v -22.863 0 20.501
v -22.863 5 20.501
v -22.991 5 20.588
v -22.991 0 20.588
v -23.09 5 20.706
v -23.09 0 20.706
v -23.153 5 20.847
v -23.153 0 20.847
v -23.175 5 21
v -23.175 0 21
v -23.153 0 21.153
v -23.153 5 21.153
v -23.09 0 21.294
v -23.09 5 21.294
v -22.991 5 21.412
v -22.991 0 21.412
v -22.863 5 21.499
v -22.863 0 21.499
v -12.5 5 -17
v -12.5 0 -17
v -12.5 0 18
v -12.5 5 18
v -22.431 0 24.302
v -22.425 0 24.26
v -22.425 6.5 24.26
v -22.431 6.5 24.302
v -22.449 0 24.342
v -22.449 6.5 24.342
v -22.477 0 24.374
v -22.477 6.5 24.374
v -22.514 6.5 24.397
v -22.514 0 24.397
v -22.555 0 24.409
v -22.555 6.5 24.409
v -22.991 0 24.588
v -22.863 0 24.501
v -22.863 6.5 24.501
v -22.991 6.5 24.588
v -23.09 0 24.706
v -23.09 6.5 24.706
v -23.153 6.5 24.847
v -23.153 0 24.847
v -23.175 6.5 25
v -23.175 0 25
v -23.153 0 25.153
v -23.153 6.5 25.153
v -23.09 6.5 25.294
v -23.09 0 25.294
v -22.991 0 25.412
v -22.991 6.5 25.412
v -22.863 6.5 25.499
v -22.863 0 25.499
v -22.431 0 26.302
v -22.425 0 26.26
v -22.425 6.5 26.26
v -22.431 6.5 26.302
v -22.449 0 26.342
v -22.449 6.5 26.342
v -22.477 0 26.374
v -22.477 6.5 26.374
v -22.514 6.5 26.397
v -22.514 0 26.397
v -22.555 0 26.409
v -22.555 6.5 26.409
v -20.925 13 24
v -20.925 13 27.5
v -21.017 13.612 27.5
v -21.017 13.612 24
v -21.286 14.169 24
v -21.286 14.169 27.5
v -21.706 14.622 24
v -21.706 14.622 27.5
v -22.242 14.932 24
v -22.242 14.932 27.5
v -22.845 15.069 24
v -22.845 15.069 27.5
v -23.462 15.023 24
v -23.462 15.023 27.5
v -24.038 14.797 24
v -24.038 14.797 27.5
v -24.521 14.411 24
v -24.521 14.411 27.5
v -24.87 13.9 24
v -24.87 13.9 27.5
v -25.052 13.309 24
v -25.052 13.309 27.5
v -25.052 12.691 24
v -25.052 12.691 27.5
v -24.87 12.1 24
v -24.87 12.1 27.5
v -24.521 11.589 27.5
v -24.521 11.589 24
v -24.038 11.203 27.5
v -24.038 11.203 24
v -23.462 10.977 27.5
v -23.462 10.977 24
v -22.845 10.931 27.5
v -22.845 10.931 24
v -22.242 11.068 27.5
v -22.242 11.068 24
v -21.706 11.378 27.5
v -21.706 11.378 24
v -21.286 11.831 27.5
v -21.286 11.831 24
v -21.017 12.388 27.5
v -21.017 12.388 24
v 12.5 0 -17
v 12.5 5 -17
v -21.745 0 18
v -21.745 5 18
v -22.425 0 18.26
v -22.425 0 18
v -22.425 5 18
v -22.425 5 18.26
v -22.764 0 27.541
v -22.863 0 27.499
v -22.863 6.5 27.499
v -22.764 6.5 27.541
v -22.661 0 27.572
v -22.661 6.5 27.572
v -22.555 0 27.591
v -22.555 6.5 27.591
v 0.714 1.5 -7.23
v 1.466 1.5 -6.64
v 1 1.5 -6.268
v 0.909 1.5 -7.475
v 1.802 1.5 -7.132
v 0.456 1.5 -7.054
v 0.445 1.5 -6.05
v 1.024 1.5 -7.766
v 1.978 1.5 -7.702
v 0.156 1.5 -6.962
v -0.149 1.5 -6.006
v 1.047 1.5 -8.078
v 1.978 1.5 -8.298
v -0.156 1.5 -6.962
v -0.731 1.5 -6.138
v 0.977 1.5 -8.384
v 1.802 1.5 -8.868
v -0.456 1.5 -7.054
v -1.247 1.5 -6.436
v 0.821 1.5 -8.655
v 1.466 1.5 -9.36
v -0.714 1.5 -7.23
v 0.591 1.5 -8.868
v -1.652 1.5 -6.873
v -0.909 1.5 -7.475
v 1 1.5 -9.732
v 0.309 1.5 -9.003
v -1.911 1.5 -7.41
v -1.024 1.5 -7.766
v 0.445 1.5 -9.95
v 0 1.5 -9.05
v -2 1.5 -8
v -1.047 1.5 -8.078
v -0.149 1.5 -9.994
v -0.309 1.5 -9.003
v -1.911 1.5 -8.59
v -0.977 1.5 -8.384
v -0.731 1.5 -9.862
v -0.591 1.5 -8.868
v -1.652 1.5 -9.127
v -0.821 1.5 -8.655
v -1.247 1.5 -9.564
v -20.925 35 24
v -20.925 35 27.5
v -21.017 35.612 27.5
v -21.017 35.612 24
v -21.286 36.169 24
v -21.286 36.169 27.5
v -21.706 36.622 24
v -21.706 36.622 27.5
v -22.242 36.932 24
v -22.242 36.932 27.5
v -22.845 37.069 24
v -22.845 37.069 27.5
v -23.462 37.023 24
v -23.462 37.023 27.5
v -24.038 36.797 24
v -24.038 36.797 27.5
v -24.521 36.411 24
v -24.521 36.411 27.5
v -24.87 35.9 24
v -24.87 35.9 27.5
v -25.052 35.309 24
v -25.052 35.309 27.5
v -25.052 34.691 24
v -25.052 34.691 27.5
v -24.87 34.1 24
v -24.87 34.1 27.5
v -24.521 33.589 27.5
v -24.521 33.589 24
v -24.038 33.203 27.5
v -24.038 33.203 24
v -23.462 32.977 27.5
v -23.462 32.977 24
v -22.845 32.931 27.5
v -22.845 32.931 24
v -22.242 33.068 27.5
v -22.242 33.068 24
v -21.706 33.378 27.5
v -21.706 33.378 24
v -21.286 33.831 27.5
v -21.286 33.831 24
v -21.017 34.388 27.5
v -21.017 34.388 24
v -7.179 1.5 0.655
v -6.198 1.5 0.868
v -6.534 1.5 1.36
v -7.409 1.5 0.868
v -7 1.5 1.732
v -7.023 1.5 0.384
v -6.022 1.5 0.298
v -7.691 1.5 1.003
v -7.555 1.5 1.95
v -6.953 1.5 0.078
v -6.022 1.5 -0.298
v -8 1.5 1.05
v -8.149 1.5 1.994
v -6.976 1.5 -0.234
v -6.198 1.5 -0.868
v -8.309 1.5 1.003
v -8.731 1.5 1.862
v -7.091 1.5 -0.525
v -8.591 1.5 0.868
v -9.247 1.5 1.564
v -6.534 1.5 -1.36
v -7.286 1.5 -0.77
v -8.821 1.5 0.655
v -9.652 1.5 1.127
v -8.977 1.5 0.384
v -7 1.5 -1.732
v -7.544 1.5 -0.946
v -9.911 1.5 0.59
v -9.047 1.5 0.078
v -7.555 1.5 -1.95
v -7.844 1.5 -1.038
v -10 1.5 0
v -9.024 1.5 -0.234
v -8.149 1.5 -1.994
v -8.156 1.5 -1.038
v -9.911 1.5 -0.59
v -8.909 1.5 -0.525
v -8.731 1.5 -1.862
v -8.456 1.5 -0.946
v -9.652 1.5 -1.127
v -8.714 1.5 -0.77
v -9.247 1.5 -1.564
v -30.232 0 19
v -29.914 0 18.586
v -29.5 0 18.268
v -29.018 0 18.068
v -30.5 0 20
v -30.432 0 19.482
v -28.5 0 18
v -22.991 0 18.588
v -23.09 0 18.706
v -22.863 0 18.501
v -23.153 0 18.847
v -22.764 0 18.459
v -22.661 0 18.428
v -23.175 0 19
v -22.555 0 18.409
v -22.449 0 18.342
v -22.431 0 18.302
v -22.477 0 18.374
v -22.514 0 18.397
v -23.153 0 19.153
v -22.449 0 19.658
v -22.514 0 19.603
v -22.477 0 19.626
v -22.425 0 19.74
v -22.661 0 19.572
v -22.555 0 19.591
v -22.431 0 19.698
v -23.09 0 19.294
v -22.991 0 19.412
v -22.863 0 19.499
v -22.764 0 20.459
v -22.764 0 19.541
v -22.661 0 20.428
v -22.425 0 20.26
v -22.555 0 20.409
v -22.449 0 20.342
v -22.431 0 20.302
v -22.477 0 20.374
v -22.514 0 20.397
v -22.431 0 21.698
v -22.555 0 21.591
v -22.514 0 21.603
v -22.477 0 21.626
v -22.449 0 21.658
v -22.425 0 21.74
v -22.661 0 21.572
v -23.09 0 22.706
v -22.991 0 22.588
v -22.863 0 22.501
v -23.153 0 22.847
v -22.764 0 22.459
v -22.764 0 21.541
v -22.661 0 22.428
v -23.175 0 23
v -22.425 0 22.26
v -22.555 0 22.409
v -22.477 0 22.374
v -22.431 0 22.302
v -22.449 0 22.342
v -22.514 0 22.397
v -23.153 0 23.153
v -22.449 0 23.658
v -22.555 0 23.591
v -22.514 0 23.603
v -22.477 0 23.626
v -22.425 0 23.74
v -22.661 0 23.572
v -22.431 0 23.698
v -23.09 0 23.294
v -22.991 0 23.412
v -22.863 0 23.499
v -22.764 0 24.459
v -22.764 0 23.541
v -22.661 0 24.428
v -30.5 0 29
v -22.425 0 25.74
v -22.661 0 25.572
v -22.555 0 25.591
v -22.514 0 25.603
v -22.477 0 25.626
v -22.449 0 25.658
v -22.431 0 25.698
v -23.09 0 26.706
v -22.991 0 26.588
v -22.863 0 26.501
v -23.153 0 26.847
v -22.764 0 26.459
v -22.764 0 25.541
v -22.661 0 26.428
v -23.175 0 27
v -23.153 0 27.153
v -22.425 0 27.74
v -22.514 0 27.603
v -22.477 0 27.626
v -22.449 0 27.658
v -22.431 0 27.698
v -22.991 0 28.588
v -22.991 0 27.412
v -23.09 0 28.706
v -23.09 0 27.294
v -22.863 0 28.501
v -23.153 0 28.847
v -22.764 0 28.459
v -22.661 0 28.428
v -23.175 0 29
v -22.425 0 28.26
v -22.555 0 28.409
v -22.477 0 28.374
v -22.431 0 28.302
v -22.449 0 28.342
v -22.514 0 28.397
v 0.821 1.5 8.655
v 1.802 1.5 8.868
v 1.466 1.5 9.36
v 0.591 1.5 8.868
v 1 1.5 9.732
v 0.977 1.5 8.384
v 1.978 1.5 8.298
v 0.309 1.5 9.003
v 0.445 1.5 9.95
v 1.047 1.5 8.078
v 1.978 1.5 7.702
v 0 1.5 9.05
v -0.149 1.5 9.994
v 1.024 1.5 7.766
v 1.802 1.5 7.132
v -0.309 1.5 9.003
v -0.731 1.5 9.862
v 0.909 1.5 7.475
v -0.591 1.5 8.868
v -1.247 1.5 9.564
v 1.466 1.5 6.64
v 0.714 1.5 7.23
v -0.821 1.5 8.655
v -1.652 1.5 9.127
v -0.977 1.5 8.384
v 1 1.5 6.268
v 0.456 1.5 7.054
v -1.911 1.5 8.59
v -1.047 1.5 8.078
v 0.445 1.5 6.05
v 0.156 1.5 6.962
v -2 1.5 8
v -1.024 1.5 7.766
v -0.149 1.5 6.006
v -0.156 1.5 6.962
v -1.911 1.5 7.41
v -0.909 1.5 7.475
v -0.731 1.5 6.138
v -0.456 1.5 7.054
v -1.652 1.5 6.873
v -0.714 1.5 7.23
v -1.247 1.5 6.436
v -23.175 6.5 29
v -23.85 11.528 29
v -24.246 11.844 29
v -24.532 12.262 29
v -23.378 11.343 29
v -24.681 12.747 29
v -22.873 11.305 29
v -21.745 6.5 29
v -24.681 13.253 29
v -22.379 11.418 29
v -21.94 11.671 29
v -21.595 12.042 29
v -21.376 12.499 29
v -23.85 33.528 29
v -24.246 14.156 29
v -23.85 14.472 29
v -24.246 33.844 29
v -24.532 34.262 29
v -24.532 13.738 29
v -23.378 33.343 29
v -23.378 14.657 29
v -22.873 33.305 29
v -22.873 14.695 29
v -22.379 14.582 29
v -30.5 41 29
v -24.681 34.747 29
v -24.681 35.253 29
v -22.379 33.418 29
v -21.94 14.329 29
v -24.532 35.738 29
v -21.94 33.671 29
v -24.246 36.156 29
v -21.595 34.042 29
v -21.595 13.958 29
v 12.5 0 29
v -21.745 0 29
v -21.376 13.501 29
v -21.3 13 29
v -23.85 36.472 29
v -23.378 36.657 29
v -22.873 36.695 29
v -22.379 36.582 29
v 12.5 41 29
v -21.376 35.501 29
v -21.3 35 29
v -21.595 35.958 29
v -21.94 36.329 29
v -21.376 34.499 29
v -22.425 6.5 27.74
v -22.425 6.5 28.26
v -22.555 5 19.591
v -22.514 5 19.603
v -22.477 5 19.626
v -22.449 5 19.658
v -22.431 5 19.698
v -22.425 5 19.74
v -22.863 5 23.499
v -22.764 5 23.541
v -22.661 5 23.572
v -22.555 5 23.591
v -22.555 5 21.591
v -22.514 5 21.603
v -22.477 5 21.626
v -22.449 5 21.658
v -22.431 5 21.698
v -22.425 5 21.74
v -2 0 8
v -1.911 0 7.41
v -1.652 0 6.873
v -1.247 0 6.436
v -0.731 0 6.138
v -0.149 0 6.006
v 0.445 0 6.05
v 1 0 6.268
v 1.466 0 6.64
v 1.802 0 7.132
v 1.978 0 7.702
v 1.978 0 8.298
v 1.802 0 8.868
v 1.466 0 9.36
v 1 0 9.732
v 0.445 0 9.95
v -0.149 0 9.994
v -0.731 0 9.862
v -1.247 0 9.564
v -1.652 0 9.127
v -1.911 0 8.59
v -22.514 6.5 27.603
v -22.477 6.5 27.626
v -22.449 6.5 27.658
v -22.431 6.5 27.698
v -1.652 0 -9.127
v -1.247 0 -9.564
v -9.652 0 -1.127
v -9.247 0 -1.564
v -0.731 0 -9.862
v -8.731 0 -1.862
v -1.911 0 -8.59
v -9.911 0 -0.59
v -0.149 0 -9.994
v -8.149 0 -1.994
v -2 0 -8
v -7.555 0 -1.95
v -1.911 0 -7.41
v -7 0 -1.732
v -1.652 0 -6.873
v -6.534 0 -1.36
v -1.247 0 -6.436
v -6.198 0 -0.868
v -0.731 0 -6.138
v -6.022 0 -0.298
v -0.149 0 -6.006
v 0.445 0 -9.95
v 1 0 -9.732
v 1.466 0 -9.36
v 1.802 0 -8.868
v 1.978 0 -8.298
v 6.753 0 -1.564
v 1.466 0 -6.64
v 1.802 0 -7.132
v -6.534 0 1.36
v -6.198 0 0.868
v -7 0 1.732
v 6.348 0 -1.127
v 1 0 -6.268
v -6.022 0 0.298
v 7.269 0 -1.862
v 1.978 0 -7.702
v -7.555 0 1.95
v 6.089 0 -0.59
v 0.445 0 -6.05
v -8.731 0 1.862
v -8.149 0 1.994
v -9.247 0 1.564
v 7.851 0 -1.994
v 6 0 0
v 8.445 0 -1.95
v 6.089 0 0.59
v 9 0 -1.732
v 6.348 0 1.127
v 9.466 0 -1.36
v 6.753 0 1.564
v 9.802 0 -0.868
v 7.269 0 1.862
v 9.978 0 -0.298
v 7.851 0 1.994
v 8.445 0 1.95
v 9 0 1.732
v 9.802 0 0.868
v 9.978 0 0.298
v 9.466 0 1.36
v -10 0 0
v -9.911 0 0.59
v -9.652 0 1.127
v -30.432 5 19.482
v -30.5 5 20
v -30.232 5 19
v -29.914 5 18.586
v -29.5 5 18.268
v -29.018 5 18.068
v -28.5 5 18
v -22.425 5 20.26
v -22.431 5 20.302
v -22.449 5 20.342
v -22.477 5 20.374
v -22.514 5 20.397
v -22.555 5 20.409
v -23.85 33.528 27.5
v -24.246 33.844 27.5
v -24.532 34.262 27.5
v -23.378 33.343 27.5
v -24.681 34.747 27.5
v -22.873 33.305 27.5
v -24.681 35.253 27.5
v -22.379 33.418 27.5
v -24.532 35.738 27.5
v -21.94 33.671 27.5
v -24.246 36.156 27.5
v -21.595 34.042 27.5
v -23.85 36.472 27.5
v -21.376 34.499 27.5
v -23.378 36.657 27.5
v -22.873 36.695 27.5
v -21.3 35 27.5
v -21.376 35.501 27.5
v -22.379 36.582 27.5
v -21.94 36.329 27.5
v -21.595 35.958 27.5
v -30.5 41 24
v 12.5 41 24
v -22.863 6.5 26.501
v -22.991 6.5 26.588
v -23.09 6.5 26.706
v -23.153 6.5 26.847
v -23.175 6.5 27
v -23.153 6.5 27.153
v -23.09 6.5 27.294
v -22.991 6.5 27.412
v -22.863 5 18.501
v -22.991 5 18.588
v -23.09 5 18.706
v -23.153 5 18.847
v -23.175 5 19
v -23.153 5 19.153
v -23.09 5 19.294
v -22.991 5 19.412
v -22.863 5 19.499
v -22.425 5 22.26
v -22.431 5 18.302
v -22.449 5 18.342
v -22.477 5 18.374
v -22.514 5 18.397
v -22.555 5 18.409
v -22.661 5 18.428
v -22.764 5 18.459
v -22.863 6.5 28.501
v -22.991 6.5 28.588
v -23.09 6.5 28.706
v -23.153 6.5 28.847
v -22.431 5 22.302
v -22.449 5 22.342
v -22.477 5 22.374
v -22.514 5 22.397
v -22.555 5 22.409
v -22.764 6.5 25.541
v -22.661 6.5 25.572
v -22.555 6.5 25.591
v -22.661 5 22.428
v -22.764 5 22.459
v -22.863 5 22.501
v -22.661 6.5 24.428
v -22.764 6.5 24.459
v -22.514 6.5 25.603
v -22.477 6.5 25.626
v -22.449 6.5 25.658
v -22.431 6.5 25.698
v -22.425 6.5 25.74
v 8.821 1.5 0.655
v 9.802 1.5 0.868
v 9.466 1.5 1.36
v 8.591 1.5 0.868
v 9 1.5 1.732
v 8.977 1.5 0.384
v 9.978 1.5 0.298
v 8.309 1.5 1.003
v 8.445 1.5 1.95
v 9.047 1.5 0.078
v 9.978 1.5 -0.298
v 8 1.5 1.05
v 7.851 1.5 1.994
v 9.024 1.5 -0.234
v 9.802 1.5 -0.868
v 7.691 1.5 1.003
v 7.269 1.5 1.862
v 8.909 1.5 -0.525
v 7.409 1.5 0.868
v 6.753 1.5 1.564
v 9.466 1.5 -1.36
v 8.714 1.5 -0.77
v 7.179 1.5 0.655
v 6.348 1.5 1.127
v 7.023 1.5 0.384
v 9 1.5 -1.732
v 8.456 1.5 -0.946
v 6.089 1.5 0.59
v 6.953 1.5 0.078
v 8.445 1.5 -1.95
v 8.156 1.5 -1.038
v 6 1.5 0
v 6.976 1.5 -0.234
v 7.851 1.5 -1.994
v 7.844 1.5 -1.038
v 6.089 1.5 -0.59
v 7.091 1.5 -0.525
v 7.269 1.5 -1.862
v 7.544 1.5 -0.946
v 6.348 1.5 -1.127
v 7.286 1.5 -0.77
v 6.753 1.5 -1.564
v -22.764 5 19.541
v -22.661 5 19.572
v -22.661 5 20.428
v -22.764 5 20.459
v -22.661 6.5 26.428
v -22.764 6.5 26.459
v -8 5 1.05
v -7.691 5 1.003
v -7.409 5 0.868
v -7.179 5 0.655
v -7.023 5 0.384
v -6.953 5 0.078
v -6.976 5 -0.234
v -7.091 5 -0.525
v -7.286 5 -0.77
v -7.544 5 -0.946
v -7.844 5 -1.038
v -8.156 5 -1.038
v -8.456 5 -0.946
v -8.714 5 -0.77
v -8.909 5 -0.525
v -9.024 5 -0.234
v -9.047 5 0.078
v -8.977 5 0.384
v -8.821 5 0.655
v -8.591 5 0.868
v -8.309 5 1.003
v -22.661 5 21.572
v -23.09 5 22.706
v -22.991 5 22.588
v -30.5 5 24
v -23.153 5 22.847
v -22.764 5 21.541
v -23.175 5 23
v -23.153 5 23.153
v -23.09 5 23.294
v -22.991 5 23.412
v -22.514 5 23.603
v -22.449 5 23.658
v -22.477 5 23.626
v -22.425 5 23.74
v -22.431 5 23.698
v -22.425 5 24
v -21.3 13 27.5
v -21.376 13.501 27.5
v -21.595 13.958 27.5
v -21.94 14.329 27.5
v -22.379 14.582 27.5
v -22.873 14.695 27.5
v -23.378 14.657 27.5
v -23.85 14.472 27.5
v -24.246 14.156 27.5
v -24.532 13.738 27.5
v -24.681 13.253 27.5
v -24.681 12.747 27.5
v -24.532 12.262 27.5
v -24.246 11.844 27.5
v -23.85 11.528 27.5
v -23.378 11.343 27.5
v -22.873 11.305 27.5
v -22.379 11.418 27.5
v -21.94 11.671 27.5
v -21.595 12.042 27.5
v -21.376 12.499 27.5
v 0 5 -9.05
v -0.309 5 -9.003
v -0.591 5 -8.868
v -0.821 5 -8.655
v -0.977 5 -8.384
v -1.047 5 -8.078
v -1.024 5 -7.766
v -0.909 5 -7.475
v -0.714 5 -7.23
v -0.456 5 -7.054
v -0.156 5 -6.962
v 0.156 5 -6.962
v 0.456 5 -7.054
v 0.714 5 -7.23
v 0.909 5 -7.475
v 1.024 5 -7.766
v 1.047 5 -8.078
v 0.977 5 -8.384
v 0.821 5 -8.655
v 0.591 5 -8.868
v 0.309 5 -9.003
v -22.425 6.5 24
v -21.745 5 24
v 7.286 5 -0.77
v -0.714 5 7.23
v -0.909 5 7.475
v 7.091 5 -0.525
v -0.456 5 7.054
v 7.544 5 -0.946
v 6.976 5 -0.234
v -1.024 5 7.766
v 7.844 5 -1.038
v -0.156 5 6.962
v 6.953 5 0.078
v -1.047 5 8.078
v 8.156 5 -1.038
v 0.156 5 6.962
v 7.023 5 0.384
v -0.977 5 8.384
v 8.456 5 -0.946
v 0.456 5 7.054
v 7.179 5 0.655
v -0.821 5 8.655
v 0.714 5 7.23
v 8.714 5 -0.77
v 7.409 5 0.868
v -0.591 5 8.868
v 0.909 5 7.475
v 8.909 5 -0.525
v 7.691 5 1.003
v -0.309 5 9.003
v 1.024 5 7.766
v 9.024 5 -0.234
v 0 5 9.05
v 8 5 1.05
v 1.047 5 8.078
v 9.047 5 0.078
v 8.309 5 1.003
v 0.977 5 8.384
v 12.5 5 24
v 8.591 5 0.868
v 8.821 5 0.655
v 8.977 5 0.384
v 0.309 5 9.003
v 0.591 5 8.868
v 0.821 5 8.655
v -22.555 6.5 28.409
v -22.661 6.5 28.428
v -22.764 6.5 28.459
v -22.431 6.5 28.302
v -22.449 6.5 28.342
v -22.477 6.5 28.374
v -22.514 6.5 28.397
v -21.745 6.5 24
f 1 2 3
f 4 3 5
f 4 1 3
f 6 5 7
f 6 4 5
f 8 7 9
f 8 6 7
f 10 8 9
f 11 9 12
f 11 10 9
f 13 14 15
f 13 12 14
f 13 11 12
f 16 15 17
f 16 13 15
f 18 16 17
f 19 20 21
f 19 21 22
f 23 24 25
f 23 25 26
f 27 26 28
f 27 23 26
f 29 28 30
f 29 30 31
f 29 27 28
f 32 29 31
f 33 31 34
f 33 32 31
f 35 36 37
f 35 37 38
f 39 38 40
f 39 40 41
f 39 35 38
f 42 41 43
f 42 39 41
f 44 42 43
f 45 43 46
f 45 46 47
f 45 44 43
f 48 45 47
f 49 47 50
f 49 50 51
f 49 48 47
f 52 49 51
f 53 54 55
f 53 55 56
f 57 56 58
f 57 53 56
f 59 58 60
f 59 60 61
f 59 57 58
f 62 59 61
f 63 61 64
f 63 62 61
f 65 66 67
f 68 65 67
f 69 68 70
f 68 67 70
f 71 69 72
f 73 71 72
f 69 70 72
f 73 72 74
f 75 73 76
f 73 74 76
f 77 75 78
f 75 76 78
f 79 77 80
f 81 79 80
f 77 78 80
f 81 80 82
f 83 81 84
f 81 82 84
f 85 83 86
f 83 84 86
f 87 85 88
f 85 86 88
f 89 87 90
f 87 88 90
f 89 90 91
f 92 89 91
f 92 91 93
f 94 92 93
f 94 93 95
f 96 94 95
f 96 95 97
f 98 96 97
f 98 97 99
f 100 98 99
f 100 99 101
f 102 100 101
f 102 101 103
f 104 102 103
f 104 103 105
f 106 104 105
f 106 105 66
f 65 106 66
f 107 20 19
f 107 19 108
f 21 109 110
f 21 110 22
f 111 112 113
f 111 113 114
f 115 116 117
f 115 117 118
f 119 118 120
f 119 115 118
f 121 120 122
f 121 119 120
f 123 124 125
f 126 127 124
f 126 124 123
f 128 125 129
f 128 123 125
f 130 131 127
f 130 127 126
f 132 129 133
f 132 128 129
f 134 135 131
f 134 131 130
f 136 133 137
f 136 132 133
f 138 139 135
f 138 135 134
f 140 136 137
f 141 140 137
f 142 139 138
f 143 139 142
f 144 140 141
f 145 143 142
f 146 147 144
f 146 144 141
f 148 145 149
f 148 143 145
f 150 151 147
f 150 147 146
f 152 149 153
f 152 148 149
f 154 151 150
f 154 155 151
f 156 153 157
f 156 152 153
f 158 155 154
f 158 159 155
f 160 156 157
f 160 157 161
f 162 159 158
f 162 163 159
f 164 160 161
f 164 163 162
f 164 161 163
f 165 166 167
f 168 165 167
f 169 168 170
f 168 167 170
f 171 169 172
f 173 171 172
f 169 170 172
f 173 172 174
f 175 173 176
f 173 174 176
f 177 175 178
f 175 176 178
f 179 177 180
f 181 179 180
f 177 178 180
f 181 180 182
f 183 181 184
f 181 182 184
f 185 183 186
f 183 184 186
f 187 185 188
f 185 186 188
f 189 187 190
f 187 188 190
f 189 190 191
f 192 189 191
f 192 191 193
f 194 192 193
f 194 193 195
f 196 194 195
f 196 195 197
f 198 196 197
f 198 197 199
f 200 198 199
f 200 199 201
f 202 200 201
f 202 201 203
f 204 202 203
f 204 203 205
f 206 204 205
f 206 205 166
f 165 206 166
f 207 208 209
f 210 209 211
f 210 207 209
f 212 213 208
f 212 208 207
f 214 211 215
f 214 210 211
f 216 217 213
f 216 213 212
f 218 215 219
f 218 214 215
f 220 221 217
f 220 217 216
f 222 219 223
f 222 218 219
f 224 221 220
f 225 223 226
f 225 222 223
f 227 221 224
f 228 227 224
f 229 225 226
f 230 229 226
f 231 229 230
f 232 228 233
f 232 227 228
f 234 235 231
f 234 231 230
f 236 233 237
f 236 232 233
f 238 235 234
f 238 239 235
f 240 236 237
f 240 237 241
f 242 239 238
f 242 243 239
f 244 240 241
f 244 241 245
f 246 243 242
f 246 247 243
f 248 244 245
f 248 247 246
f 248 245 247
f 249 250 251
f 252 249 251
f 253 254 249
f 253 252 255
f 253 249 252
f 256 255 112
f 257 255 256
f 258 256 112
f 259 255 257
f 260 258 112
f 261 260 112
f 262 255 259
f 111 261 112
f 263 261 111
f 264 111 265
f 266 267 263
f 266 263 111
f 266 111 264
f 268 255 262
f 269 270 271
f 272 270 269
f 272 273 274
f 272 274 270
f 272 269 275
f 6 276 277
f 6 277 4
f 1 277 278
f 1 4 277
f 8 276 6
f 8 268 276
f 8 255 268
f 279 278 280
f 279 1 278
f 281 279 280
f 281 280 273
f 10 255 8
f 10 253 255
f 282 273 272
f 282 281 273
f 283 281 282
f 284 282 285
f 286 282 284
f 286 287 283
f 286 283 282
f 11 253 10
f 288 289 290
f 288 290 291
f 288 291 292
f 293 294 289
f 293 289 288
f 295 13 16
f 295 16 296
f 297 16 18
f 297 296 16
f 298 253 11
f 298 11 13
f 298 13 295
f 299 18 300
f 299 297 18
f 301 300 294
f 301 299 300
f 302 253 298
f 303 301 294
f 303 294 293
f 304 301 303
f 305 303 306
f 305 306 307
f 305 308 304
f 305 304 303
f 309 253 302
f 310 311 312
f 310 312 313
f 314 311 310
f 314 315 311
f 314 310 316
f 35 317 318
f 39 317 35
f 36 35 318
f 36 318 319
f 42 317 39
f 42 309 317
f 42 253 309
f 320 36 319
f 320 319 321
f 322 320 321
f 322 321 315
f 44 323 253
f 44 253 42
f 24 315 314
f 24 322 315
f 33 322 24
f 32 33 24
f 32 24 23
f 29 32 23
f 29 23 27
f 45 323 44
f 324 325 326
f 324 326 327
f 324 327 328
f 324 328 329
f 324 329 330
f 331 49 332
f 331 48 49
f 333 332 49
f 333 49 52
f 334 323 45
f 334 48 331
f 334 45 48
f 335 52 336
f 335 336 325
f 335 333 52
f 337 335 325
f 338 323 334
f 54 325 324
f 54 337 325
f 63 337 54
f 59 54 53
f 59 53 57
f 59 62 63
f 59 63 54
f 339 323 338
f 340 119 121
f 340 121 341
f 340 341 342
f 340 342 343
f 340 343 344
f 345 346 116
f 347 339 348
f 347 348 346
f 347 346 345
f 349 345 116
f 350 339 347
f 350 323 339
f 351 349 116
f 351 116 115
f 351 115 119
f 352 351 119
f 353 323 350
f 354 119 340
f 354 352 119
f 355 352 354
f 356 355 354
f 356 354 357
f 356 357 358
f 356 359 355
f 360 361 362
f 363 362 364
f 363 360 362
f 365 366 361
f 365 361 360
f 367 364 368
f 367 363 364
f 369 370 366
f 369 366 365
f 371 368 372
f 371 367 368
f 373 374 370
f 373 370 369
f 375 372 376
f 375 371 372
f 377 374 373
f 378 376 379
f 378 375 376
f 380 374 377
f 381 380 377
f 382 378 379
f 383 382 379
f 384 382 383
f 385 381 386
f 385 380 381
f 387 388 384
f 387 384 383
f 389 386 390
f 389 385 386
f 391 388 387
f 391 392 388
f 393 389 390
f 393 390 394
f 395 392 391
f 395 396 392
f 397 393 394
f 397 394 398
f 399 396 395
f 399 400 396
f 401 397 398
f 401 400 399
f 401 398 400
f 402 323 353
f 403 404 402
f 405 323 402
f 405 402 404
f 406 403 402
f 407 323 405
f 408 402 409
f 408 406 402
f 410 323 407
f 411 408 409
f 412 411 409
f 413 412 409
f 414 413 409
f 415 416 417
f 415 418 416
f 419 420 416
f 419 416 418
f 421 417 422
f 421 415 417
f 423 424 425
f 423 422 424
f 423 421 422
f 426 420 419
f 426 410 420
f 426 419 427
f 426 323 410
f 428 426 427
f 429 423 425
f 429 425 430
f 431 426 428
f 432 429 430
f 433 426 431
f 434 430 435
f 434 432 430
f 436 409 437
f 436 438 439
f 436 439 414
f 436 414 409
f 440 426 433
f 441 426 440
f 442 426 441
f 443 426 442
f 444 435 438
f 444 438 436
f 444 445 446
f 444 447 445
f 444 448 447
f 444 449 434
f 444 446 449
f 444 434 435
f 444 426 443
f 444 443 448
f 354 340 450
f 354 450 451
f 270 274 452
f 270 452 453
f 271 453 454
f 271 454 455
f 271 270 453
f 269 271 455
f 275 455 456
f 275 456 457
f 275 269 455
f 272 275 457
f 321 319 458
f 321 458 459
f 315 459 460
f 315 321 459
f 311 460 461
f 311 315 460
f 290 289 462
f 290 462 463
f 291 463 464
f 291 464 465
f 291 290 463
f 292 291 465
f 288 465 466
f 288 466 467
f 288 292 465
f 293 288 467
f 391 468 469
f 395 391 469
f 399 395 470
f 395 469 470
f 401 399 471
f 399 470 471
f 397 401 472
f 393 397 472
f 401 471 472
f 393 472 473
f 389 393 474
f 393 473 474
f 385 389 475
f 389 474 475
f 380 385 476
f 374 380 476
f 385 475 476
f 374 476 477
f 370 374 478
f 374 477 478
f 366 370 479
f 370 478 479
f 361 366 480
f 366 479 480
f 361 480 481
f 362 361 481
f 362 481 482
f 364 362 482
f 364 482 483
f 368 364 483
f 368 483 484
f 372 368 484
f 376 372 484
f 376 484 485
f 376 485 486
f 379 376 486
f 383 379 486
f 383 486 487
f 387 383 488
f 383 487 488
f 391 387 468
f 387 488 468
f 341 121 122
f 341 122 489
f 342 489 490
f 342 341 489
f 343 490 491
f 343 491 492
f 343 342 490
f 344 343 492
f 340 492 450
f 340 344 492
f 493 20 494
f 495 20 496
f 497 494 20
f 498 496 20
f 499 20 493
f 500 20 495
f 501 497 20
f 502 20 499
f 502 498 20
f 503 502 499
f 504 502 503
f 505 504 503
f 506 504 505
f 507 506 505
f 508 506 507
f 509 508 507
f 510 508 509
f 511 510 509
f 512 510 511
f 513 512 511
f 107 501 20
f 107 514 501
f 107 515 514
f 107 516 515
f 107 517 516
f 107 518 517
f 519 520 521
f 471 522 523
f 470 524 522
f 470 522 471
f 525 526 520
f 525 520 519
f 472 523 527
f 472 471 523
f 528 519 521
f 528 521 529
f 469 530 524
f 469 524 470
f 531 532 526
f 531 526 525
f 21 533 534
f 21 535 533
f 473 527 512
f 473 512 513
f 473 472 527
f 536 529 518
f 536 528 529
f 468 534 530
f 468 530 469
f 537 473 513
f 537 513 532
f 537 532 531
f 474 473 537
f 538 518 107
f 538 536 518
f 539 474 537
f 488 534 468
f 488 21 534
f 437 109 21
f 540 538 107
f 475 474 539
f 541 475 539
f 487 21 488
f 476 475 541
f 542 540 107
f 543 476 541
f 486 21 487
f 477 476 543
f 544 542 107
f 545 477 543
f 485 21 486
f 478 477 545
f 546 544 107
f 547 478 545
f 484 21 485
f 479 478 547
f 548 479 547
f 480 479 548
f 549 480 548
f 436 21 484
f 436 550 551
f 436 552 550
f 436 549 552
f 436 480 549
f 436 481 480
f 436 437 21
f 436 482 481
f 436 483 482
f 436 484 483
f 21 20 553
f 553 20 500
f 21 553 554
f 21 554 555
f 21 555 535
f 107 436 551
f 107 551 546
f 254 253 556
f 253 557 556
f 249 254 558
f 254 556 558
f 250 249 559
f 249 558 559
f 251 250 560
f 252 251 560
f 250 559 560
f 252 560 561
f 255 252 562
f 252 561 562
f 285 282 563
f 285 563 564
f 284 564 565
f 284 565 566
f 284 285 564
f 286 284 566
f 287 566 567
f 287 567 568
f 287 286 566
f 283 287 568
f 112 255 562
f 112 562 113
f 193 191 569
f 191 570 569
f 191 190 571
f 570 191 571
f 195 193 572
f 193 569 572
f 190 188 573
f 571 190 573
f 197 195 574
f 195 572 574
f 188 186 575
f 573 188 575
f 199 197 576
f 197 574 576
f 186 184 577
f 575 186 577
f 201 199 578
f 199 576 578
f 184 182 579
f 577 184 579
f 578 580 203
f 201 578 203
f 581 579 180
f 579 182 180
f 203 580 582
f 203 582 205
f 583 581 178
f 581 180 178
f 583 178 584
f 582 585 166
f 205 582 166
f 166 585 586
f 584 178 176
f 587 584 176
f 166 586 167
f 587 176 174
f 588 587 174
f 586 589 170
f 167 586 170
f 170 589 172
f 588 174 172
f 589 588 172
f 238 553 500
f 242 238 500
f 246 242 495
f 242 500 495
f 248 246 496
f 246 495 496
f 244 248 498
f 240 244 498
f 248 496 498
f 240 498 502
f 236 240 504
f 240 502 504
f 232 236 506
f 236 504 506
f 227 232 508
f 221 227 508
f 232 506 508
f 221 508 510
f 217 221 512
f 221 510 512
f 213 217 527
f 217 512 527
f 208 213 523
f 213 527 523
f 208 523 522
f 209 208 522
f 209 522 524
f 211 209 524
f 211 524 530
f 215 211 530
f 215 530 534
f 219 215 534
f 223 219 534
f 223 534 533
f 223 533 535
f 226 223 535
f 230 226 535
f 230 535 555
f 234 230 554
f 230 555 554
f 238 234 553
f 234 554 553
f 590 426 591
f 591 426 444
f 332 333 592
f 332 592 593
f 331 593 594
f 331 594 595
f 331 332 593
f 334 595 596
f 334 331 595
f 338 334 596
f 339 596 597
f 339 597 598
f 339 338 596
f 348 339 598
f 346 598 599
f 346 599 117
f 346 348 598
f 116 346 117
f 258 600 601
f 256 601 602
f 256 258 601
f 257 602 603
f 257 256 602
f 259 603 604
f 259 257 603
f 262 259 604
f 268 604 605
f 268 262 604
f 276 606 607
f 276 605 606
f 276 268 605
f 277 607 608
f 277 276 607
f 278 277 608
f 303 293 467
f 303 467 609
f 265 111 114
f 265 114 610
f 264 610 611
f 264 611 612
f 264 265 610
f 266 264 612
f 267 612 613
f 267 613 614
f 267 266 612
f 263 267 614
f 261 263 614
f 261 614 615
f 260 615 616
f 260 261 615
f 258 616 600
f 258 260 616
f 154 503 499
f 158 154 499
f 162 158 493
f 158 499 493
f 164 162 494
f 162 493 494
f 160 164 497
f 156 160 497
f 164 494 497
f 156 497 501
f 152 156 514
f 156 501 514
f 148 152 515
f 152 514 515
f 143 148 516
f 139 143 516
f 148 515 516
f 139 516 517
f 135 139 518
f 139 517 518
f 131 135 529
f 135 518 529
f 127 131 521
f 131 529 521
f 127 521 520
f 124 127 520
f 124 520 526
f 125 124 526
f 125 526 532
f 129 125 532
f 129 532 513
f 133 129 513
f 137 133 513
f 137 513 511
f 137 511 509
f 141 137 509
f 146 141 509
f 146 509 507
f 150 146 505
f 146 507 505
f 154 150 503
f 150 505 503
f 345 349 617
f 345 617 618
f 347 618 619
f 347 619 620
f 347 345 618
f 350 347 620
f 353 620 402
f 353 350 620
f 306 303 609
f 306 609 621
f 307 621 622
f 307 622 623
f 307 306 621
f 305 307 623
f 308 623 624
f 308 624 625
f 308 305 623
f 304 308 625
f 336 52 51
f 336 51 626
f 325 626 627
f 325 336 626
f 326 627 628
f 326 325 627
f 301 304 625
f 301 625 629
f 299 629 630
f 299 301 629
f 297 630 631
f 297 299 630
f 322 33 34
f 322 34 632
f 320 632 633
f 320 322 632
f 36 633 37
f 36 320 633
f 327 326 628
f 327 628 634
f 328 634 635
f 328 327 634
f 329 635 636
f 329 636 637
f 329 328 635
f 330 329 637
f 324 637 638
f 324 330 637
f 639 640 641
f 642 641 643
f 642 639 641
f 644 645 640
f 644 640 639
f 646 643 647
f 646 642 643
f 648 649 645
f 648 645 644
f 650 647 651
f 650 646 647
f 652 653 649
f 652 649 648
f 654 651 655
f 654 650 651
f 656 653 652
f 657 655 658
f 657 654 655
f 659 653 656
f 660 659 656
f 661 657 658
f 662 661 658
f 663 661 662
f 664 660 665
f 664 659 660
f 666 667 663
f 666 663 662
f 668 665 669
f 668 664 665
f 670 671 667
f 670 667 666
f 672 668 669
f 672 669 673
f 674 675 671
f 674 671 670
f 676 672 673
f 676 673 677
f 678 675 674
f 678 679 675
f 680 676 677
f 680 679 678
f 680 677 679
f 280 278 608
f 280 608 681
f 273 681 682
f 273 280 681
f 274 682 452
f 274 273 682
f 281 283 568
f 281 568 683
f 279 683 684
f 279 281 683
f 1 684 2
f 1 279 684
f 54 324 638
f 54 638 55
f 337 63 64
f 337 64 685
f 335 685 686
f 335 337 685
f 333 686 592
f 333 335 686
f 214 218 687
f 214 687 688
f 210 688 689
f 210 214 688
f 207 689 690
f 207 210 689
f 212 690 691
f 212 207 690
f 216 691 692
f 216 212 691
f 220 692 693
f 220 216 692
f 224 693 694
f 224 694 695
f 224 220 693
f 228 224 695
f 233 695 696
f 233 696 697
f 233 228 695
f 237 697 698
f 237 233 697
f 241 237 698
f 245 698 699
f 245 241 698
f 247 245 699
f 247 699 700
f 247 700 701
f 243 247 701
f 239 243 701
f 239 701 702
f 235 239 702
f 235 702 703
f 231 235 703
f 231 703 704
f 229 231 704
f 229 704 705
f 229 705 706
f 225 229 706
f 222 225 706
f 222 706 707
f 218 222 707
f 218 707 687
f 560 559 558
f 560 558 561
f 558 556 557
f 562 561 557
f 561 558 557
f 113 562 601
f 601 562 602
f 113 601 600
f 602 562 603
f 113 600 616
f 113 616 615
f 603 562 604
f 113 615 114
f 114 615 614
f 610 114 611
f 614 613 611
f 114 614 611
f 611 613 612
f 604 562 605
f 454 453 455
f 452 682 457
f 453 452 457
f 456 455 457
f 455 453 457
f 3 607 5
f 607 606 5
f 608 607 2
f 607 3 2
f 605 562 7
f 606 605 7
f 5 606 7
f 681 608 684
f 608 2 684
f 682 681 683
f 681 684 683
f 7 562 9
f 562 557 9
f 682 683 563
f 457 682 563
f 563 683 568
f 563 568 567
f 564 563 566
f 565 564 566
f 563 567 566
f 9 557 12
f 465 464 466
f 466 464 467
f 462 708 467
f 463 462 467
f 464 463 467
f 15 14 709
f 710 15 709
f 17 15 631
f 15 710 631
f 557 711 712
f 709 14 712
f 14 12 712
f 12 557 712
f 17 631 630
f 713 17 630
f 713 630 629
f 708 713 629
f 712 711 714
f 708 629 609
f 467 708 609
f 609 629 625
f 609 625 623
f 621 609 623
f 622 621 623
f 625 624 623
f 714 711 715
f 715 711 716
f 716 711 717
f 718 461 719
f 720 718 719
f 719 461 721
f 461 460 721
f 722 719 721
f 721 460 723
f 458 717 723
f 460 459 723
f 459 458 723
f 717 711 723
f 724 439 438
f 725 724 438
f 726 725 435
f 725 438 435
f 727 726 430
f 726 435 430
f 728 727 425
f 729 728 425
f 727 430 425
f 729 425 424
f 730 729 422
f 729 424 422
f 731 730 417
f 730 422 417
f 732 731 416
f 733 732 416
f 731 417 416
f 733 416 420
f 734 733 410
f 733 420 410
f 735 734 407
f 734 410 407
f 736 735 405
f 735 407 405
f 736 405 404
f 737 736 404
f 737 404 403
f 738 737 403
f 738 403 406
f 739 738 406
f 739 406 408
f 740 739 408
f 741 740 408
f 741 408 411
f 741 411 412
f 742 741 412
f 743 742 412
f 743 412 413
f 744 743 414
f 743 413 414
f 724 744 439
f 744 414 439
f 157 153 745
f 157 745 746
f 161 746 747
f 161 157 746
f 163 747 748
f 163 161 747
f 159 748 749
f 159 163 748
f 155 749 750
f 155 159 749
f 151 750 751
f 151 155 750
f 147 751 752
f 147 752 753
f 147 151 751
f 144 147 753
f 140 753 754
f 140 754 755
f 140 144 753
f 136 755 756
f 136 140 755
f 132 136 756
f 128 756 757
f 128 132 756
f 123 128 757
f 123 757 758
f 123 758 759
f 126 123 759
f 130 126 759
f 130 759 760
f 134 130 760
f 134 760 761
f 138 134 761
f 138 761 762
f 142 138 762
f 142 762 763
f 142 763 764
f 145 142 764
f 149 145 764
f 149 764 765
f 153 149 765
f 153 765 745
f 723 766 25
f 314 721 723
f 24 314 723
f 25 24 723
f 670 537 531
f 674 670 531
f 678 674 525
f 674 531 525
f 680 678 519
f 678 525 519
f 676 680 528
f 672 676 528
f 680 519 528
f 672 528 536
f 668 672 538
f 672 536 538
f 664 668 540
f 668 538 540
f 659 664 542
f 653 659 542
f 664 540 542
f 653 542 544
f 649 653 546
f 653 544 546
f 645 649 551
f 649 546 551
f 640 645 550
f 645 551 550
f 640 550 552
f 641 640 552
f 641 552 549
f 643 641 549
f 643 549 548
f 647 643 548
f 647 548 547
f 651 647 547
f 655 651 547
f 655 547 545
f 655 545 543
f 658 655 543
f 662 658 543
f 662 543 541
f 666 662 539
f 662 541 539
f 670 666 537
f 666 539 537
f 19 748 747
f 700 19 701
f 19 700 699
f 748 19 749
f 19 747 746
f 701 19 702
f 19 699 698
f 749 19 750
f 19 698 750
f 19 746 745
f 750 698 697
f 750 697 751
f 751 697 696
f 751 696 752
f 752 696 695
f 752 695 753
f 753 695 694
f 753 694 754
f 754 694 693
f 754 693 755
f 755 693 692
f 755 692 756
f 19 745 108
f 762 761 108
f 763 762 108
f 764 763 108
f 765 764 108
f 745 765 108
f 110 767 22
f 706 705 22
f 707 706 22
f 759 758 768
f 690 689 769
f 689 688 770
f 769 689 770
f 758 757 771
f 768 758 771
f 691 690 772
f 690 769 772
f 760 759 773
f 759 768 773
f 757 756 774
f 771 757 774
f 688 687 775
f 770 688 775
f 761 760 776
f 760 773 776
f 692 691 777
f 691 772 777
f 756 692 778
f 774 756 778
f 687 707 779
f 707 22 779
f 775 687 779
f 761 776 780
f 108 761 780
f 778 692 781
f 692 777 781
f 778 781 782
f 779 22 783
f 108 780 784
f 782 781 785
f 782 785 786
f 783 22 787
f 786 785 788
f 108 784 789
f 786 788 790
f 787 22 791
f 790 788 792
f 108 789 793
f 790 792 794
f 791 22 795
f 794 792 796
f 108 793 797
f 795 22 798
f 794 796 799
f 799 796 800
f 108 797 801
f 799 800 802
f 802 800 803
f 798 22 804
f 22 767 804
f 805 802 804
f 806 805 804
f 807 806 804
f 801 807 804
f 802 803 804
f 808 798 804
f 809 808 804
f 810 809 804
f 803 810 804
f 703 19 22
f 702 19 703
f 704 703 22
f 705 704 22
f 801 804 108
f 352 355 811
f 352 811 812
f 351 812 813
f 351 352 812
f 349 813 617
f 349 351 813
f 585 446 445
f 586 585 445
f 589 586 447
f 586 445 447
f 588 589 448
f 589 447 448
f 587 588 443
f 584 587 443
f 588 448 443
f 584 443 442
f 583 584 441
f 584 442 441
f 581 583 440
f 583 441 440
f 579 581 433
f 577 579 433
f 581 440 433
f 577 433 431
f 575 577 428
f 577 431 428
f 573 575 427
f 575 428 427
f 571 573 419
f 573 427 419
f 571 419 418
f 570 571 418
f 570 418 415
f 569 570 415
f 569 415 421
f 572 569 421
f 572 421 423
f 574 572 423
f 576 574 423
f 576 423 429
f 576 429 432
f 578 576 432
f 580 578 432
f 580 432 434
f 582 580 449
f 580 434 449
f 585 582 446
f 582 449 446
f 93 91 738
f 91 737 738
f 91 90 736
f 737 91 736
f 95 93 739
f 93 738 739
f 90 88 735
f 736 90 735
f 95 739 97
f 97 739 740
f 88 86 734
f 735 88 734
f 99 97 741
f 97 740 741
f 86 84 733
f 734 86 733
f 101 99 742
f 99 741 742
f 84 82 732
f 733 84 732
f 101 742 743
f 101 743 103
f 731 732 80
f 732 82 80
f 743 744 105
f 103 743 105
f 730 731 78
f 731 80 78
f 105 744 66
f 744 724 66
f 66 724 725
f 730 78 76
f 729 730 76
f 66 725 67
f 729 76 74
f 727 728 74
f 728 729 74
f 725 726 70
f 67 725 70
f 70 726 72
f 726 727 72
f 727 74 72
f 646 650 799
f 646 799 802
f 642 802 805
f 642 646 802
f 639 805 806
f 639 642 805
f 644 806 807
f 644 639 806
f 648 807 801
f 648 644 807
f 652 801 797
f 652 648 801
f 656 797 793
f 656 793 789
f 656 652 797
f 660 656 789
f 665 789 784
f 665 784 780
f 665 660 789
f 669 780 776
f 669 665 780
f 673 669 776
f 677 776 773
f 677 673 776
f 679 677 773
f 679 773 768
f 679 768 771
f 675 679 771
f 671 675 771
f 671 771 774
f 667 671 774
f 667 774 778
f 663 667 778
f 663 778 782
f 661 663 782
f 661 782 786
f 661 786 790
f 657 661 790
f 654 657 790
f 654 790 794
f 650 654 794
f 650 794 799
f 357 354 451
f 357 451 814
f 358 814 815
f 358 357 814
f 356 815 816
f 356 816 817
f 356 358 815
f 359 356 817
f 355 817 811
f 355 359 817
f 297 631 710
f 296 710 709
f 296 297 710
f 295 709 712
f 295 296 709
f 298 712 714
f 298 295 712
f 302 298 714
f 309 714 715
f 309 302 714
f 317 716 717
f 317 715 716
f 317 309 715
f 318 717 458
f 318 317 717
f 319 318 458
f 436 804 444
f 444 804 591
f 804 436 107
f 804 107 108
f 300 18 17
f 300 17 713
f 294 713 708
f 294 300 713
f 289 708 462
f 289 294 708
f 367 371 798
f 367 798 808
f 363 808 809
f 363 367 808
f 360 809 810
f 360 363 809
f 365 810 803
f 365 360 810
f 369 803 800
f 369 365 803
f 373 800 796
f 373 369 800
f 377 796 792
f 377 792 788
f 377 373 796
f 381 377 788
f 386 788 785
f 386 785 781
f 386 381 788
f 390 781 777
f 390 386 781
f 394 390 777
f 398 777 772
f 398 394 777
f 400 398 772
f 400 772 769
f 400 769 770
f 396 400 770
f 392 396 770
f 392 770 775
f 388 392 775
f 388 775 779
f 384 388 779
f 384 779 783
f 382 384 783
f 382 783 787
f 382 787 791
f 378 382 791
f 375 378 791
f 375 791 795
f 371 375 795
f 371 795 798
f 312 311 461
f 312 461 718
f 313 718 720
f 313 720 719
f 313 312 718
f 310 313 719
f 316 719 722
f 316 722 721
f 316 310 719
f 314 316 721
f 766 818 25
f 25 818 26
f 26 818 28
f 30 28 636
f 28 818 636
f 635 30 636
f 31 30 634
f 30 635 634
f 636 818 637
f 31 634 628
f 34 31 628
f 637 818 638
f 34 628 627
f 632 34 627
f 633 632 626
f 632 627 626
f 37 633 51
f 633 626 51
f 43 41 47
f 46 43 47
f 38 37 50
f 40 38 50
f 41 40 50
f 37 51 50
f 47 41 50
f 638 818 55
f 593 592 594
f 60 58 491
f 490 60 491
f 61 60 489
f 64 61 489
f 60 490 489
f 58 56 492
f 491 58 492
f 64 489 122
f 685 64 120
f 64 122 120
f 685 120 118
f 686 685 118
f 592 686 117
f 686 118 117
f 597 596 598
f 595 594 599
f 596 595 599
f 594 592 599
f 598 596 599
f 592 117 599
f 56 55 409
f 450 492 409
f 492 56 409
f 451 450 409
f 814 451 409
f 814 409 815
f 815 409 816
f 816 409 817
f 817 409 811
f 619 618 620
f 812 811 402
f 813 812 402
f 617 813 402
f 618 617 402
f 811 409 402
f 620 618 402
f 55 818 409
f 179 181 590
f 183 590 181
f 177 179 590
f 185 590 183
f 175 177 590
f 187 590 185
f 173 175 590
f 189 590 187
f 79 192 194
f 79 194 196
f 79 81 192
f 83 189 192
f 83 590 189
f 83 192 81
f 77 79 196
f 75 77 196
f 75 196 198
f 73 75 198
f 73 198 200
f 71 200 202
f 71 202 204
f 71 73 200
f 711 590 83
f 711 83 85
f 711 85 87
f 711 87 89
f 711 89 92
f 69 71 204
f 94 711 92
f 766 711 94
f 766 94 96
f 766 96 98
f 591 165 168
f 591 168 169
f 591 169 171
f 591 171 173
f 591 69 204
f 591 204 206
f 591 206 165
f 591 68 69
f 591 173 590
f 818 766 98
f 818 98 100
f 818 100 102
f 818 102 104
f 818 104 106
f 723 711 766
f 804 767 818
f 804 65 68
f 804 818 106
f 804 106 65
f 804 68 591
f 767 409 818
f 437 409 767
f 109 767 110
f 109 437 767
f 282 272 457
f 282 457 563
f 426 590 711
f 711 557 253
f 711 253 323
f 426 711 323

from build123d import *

# Parameters (mm, degrees)
SKETCH2_W           = 25
SKETCH2_H           = 41
BOSS_EXTRUDE1_DEPTH = 5
SKETCH4_W           = 25
SKETCH4_H           = 41
BOSS_EXTRUDE2_DEPTH = 5
SKETCH5_W           = 18
SKETCH5_H           = 5
BOSS_EXTRUDE3_DEPTH = 41
SKETCH6_R           = 2.075
CUT_EXTRUDE1_DEPTH  = 5
SKETCH11_R          = 2.075
SKETCH11_R_2        = 1.7
BOSS_EXTRUDE5_DEPTH = 1.5
SKETCH12_W          = 18
SKETCH12_H          = 6
BOSS_EXTRUDE6_DEPTH = 5
FILLET5_R           = 2
SKETCH13_R          = 2
CUT_EXTRUDE2_DEPTH  = 1.5
CUT_EXTRUDE7_DEPTH  = 6.5


with BuildPart() as part:
    # Sketch2 → Boss-Extrude1 (new body)
    with BuildSketch(Plane(origin=(0, 0, 0), x_dir=(1, 0, 0), z_dir=(0, 1, 0))):
        with Locations((0, -3.5)):
            Rectangle(SKETCH2_W, SKETCH2_H)
        with BuildLine():
            ThreePointArc((0, -6.95), (-1.05, -8), (0, -9.05))
            ThreePointArc((0, -9.05), (1.05, -8), (0, -6.95))
        make_face(mode=Mode.SUBTRACT)
        with BuildLine():
            ThreePointArc((-8, 1.05), (-9.05, 0), (-8, -1.05))
            ThreePointArc((-8, -1.05), (-6.95, 0), (-8, 1.05))
        make_face(mode=Mode.SUBTRACT)
        with BuildLine():
            ThreePointArc((8, 1.05), (6.95, 0), (8, -1.05))
            ThreePointArc((8, -1.05), (9.05, 0), (8, 1.05))
        make_face(mode=Mode.SUBTRACT)
        with BuildLine():
            ThreePointArc((0, 6.95), (1.05, 8), (0, 9.05))
            ThreePointArc((0, 9.05), (-1.05, 8), (0, 6.95))
        make_face(mode=Mode.SUBTRACT)
    extrude(amount=BOSS_EXTRUDE1_DEPTH)

    # Sketch4 → Boss-Extrude2 (add)
    with BuildSketch(Plane.XY.offset(24)):
        with Locations((0, 20.5)):
            Rectangle(SKETCH4_W, SKETCH4_H)
    extrude(amount=BOSS_EXTRUDE2_DEPTH)

    # Sketch5 → Boss-Extrude3 (add)
    with BuildSketch(Plane.XZ):
        with Locations((-21.5, 26.5)):
            Rectangle(SKETCH5_W, SKETCH5_H)
    extrude(amount=-BOSS_EXTRUDE3_DEPTH)

    # Sketch6 → Cut-Extrude1 (cut)
    with BuildSketch(Plane.XY.offset(29)):
        with Locations((-23, 13)):
            Circle(SKETCH6_R)
        with Locations((-23, 35)):
            Circle(SKETCH6_R)
    extrude(amount=-CUT_EXTRUDE1_DEPTH, mode=Mode.SUBTRACT)

    # Sketch11 → Boss-Extrude5 (add)
    with BuildSketch(Plane.XY.offset(29)):
        with Locations((-23, 13)):
            Circle(SKETCH11_R)
        with Locations((-23, 13)):
            Circle(SKETCH11_R_2, mode=Mode.SUBTRACT)
        with Locations((-23, 35)):
            Circle(SKETCH11_R)
        with Locations((-23, 35)):
            Circle(SKETCH11_R_2, mode=Mode.SUBTRACT)
    extrude(amount=-BOSS_EXTRUDE5_DEPTH)

    # Sketch12 → Boss-Extrude6 (add)
    with BuildSketch(Plane.XZ):
        with Locations((-21.5, 21)):
            Rectangle(SKETCH12_W, SKETCH12_H)
    extrude(amount=-BOSS_EXTRUDE6_DEPTH)

    # Fillet5
    fillet5_edges = [part.edges().sort_by_distance(p)[0] for p in [
        (-30.5, 2.5, 18),
    ]]
    fillet(fillet5_edges, radius=FILLET5_R)

    # Sketch13 → Cut-Extrude2 (cut)
    with BuildSketch(Plane(origin=(0, 0, 0), x_dir=(-1, 0, 0), z_dir=(0, -1, 0))):
        with Locations((0, -8)):
            Circle(SKETCH13_R)
        with Locations((8, 0)):
            Circle(SKETCH13_R)
        with Locations((0, 8)):
            Circle(SKETCH13_R)
        with Locations((-8, 0)):
            Circle(SKETCH13_R)
    extrude(amount=-CUT_EXTRUDE2_DEPTH, mode=Mode.SUBTRACT)

    # Sketch15 → Cut-Extrude7 (cut)
    with BuildSketch(Plane.XZ):
        with BuildLine():
            Line((-21.744637892, 29), (-21.744637892, 18))
            Line((-21.744637892, 18), (-21.794637892, 18))
            Line((-21.794637892, 18), (-22.424637892, 18))
            Line((-22.424637892, 18), (-22.424637892, 18.259824575))
            ThreePointArc((-22.424637892, 18.259824575), (-22.46186648, 18.358731646), (-22.555072675, 18.408543109))
            ThreePointArc((-22.555072675, 18.408543109), (-22.712700046, 18.442388286), (-22.862840139, 18.501123596))
            ThreePointArc((-22.862840139, 18.501123596), (-23.174637892, 19), (-22.862840139, 19.498876404))
            ThreePointArc((-22.862840139, 19.498876404), (-22.712700046, 19.557611714), (-22.555072675, 19.591456891))
            ThreePointArc((-22.555072675, 19.591456891), (-22.46186648, 19.641268354), (-22.424637892, 19.740175425))
            Line((-22.424637892, 19.740175425), (-22.424637892, 20.259824575))
            ThreePointArc((-22.424637892, 20.259824575), (-22.46186648, 20.358731646), (-22.555072675, 20.408543109))
            ThreePointArc((-22.555072675, 20.408543109), (-22.712700046, 20.442388286), (-22.862840139, 20.501123596))
            ThreePointArc((-22.862840139, 20.501123596), (-23.174637892, 21), (-22.862840139, 21.498876404))
            ThreePointArc((-22.862840139, 21.498876404), (-22.712700046, 21.557611714), (-22.555072675, 21.591456891))
            ThreePointArc((-22.555072675, 21.591456891), (-22.46186648, 21.641268354), (-22.424637892, 21.740175425))
            Line((-22.424637892, 21.740175425), (-22.424637892, 22.259824575))
            ThreePointArc((-22.424637892, 22.259824575), (-22.46186648, 22.358731646), (-22.555072675, 22.408543109))
            ThreePointArc((-22.555072675, 22.408543109), (-22.712700046, 22.442388286), (-22.862840139, 22.501123596))
            ThreePointArc((-22.862840139, 22.501123596), (-23.174637892, 23), (-22.862840139, 23.498876404))
            ThreePointArc((-22.862840139, 23.498876404), (-22.712700046, 23.557611714), (-22.555072675, 23.591456891))
            ThreePointArc((-22.555072675, 23.591456891), (-22.46186648, 23.641268354), (-22.424637892, 23.740175425))
            Line((-22.424637892, 23.740175425), (-22.424637892, 24.259824575))
            ThreePointArc((-22.424637892, 24.259824575), (-22.46186648, 24.358731646), (-22.555072675, 24.408543109))
            ThreePointArc((-22.555072675, 24.408543109), (-22.712700046, 24.442388286), (-22.862840139, 24.501123596))
            ThreePointArc((-22.862840139, 24.501123596), (-23.174637892, 25), (-22.862840139, 25.498876404))
            ThreePointArc((-22.862840139, 25.498876404), (-22.712700046, 25.557611714), (-22.555072675, 25.591456891))
            ThreePointArc((-22.555072675, 25.591456891), (-22.46186648, 25.641268354), (-22.424637892, 25.740175425))
            Line((-22.424637892, 25.740175425), (-22.424637892, 26.259824575))
            ThreePointArc((-22.424637892, 26.259824575), (-22.46186648, 26.358731646), (-22.555072675, 26.408543109))
            ThreePointArc((-22.555072675, 26.408543109), (-22.712700046, 26.442388286), (-22.862840139, 26.501123596))
            ThreePointArc((-22.862840139, 26.501123596), (-23.174637892, 27), (-22.862840139, 27.498876404))
            ThreePointArc((-22.862840139, 27.498876404), (-22.712700046, 27.557611714), (-22.555072675, 27.591456891))
            ThreePointArc((-22.555072675, 27.591456891), (-22.46186648, 27.641268354), (-22.424637892, 27.740175425))
            Line((-22.424637892, 27.740175425), (-22.424637892, 28.259824575))
            ThreePointArc((-22.424637892, 28.259824575), (-22.46186648, 28.358731646), (-22.555072675, 28.408543109))
            ThreePointArc((-22.555072675, 28.408543109), (-22.712700046, 28.442388286), (-22.862840139, 28.501123596))
            ThreePointArc((-22.862840139, 28.501123596), (-23.090276951, 28.705850588), (-23.174637892, 29))
            Line((-23.174637892, 29), (-21.794637892, 29))
            Line((-21.794637892, 29), (-21.744637892, 29))
        make_face()
    extrude(amount=-CUT_EXTRUDE7_DEPTH, mode=Mode.SUBTRACT)


solid = part.part
